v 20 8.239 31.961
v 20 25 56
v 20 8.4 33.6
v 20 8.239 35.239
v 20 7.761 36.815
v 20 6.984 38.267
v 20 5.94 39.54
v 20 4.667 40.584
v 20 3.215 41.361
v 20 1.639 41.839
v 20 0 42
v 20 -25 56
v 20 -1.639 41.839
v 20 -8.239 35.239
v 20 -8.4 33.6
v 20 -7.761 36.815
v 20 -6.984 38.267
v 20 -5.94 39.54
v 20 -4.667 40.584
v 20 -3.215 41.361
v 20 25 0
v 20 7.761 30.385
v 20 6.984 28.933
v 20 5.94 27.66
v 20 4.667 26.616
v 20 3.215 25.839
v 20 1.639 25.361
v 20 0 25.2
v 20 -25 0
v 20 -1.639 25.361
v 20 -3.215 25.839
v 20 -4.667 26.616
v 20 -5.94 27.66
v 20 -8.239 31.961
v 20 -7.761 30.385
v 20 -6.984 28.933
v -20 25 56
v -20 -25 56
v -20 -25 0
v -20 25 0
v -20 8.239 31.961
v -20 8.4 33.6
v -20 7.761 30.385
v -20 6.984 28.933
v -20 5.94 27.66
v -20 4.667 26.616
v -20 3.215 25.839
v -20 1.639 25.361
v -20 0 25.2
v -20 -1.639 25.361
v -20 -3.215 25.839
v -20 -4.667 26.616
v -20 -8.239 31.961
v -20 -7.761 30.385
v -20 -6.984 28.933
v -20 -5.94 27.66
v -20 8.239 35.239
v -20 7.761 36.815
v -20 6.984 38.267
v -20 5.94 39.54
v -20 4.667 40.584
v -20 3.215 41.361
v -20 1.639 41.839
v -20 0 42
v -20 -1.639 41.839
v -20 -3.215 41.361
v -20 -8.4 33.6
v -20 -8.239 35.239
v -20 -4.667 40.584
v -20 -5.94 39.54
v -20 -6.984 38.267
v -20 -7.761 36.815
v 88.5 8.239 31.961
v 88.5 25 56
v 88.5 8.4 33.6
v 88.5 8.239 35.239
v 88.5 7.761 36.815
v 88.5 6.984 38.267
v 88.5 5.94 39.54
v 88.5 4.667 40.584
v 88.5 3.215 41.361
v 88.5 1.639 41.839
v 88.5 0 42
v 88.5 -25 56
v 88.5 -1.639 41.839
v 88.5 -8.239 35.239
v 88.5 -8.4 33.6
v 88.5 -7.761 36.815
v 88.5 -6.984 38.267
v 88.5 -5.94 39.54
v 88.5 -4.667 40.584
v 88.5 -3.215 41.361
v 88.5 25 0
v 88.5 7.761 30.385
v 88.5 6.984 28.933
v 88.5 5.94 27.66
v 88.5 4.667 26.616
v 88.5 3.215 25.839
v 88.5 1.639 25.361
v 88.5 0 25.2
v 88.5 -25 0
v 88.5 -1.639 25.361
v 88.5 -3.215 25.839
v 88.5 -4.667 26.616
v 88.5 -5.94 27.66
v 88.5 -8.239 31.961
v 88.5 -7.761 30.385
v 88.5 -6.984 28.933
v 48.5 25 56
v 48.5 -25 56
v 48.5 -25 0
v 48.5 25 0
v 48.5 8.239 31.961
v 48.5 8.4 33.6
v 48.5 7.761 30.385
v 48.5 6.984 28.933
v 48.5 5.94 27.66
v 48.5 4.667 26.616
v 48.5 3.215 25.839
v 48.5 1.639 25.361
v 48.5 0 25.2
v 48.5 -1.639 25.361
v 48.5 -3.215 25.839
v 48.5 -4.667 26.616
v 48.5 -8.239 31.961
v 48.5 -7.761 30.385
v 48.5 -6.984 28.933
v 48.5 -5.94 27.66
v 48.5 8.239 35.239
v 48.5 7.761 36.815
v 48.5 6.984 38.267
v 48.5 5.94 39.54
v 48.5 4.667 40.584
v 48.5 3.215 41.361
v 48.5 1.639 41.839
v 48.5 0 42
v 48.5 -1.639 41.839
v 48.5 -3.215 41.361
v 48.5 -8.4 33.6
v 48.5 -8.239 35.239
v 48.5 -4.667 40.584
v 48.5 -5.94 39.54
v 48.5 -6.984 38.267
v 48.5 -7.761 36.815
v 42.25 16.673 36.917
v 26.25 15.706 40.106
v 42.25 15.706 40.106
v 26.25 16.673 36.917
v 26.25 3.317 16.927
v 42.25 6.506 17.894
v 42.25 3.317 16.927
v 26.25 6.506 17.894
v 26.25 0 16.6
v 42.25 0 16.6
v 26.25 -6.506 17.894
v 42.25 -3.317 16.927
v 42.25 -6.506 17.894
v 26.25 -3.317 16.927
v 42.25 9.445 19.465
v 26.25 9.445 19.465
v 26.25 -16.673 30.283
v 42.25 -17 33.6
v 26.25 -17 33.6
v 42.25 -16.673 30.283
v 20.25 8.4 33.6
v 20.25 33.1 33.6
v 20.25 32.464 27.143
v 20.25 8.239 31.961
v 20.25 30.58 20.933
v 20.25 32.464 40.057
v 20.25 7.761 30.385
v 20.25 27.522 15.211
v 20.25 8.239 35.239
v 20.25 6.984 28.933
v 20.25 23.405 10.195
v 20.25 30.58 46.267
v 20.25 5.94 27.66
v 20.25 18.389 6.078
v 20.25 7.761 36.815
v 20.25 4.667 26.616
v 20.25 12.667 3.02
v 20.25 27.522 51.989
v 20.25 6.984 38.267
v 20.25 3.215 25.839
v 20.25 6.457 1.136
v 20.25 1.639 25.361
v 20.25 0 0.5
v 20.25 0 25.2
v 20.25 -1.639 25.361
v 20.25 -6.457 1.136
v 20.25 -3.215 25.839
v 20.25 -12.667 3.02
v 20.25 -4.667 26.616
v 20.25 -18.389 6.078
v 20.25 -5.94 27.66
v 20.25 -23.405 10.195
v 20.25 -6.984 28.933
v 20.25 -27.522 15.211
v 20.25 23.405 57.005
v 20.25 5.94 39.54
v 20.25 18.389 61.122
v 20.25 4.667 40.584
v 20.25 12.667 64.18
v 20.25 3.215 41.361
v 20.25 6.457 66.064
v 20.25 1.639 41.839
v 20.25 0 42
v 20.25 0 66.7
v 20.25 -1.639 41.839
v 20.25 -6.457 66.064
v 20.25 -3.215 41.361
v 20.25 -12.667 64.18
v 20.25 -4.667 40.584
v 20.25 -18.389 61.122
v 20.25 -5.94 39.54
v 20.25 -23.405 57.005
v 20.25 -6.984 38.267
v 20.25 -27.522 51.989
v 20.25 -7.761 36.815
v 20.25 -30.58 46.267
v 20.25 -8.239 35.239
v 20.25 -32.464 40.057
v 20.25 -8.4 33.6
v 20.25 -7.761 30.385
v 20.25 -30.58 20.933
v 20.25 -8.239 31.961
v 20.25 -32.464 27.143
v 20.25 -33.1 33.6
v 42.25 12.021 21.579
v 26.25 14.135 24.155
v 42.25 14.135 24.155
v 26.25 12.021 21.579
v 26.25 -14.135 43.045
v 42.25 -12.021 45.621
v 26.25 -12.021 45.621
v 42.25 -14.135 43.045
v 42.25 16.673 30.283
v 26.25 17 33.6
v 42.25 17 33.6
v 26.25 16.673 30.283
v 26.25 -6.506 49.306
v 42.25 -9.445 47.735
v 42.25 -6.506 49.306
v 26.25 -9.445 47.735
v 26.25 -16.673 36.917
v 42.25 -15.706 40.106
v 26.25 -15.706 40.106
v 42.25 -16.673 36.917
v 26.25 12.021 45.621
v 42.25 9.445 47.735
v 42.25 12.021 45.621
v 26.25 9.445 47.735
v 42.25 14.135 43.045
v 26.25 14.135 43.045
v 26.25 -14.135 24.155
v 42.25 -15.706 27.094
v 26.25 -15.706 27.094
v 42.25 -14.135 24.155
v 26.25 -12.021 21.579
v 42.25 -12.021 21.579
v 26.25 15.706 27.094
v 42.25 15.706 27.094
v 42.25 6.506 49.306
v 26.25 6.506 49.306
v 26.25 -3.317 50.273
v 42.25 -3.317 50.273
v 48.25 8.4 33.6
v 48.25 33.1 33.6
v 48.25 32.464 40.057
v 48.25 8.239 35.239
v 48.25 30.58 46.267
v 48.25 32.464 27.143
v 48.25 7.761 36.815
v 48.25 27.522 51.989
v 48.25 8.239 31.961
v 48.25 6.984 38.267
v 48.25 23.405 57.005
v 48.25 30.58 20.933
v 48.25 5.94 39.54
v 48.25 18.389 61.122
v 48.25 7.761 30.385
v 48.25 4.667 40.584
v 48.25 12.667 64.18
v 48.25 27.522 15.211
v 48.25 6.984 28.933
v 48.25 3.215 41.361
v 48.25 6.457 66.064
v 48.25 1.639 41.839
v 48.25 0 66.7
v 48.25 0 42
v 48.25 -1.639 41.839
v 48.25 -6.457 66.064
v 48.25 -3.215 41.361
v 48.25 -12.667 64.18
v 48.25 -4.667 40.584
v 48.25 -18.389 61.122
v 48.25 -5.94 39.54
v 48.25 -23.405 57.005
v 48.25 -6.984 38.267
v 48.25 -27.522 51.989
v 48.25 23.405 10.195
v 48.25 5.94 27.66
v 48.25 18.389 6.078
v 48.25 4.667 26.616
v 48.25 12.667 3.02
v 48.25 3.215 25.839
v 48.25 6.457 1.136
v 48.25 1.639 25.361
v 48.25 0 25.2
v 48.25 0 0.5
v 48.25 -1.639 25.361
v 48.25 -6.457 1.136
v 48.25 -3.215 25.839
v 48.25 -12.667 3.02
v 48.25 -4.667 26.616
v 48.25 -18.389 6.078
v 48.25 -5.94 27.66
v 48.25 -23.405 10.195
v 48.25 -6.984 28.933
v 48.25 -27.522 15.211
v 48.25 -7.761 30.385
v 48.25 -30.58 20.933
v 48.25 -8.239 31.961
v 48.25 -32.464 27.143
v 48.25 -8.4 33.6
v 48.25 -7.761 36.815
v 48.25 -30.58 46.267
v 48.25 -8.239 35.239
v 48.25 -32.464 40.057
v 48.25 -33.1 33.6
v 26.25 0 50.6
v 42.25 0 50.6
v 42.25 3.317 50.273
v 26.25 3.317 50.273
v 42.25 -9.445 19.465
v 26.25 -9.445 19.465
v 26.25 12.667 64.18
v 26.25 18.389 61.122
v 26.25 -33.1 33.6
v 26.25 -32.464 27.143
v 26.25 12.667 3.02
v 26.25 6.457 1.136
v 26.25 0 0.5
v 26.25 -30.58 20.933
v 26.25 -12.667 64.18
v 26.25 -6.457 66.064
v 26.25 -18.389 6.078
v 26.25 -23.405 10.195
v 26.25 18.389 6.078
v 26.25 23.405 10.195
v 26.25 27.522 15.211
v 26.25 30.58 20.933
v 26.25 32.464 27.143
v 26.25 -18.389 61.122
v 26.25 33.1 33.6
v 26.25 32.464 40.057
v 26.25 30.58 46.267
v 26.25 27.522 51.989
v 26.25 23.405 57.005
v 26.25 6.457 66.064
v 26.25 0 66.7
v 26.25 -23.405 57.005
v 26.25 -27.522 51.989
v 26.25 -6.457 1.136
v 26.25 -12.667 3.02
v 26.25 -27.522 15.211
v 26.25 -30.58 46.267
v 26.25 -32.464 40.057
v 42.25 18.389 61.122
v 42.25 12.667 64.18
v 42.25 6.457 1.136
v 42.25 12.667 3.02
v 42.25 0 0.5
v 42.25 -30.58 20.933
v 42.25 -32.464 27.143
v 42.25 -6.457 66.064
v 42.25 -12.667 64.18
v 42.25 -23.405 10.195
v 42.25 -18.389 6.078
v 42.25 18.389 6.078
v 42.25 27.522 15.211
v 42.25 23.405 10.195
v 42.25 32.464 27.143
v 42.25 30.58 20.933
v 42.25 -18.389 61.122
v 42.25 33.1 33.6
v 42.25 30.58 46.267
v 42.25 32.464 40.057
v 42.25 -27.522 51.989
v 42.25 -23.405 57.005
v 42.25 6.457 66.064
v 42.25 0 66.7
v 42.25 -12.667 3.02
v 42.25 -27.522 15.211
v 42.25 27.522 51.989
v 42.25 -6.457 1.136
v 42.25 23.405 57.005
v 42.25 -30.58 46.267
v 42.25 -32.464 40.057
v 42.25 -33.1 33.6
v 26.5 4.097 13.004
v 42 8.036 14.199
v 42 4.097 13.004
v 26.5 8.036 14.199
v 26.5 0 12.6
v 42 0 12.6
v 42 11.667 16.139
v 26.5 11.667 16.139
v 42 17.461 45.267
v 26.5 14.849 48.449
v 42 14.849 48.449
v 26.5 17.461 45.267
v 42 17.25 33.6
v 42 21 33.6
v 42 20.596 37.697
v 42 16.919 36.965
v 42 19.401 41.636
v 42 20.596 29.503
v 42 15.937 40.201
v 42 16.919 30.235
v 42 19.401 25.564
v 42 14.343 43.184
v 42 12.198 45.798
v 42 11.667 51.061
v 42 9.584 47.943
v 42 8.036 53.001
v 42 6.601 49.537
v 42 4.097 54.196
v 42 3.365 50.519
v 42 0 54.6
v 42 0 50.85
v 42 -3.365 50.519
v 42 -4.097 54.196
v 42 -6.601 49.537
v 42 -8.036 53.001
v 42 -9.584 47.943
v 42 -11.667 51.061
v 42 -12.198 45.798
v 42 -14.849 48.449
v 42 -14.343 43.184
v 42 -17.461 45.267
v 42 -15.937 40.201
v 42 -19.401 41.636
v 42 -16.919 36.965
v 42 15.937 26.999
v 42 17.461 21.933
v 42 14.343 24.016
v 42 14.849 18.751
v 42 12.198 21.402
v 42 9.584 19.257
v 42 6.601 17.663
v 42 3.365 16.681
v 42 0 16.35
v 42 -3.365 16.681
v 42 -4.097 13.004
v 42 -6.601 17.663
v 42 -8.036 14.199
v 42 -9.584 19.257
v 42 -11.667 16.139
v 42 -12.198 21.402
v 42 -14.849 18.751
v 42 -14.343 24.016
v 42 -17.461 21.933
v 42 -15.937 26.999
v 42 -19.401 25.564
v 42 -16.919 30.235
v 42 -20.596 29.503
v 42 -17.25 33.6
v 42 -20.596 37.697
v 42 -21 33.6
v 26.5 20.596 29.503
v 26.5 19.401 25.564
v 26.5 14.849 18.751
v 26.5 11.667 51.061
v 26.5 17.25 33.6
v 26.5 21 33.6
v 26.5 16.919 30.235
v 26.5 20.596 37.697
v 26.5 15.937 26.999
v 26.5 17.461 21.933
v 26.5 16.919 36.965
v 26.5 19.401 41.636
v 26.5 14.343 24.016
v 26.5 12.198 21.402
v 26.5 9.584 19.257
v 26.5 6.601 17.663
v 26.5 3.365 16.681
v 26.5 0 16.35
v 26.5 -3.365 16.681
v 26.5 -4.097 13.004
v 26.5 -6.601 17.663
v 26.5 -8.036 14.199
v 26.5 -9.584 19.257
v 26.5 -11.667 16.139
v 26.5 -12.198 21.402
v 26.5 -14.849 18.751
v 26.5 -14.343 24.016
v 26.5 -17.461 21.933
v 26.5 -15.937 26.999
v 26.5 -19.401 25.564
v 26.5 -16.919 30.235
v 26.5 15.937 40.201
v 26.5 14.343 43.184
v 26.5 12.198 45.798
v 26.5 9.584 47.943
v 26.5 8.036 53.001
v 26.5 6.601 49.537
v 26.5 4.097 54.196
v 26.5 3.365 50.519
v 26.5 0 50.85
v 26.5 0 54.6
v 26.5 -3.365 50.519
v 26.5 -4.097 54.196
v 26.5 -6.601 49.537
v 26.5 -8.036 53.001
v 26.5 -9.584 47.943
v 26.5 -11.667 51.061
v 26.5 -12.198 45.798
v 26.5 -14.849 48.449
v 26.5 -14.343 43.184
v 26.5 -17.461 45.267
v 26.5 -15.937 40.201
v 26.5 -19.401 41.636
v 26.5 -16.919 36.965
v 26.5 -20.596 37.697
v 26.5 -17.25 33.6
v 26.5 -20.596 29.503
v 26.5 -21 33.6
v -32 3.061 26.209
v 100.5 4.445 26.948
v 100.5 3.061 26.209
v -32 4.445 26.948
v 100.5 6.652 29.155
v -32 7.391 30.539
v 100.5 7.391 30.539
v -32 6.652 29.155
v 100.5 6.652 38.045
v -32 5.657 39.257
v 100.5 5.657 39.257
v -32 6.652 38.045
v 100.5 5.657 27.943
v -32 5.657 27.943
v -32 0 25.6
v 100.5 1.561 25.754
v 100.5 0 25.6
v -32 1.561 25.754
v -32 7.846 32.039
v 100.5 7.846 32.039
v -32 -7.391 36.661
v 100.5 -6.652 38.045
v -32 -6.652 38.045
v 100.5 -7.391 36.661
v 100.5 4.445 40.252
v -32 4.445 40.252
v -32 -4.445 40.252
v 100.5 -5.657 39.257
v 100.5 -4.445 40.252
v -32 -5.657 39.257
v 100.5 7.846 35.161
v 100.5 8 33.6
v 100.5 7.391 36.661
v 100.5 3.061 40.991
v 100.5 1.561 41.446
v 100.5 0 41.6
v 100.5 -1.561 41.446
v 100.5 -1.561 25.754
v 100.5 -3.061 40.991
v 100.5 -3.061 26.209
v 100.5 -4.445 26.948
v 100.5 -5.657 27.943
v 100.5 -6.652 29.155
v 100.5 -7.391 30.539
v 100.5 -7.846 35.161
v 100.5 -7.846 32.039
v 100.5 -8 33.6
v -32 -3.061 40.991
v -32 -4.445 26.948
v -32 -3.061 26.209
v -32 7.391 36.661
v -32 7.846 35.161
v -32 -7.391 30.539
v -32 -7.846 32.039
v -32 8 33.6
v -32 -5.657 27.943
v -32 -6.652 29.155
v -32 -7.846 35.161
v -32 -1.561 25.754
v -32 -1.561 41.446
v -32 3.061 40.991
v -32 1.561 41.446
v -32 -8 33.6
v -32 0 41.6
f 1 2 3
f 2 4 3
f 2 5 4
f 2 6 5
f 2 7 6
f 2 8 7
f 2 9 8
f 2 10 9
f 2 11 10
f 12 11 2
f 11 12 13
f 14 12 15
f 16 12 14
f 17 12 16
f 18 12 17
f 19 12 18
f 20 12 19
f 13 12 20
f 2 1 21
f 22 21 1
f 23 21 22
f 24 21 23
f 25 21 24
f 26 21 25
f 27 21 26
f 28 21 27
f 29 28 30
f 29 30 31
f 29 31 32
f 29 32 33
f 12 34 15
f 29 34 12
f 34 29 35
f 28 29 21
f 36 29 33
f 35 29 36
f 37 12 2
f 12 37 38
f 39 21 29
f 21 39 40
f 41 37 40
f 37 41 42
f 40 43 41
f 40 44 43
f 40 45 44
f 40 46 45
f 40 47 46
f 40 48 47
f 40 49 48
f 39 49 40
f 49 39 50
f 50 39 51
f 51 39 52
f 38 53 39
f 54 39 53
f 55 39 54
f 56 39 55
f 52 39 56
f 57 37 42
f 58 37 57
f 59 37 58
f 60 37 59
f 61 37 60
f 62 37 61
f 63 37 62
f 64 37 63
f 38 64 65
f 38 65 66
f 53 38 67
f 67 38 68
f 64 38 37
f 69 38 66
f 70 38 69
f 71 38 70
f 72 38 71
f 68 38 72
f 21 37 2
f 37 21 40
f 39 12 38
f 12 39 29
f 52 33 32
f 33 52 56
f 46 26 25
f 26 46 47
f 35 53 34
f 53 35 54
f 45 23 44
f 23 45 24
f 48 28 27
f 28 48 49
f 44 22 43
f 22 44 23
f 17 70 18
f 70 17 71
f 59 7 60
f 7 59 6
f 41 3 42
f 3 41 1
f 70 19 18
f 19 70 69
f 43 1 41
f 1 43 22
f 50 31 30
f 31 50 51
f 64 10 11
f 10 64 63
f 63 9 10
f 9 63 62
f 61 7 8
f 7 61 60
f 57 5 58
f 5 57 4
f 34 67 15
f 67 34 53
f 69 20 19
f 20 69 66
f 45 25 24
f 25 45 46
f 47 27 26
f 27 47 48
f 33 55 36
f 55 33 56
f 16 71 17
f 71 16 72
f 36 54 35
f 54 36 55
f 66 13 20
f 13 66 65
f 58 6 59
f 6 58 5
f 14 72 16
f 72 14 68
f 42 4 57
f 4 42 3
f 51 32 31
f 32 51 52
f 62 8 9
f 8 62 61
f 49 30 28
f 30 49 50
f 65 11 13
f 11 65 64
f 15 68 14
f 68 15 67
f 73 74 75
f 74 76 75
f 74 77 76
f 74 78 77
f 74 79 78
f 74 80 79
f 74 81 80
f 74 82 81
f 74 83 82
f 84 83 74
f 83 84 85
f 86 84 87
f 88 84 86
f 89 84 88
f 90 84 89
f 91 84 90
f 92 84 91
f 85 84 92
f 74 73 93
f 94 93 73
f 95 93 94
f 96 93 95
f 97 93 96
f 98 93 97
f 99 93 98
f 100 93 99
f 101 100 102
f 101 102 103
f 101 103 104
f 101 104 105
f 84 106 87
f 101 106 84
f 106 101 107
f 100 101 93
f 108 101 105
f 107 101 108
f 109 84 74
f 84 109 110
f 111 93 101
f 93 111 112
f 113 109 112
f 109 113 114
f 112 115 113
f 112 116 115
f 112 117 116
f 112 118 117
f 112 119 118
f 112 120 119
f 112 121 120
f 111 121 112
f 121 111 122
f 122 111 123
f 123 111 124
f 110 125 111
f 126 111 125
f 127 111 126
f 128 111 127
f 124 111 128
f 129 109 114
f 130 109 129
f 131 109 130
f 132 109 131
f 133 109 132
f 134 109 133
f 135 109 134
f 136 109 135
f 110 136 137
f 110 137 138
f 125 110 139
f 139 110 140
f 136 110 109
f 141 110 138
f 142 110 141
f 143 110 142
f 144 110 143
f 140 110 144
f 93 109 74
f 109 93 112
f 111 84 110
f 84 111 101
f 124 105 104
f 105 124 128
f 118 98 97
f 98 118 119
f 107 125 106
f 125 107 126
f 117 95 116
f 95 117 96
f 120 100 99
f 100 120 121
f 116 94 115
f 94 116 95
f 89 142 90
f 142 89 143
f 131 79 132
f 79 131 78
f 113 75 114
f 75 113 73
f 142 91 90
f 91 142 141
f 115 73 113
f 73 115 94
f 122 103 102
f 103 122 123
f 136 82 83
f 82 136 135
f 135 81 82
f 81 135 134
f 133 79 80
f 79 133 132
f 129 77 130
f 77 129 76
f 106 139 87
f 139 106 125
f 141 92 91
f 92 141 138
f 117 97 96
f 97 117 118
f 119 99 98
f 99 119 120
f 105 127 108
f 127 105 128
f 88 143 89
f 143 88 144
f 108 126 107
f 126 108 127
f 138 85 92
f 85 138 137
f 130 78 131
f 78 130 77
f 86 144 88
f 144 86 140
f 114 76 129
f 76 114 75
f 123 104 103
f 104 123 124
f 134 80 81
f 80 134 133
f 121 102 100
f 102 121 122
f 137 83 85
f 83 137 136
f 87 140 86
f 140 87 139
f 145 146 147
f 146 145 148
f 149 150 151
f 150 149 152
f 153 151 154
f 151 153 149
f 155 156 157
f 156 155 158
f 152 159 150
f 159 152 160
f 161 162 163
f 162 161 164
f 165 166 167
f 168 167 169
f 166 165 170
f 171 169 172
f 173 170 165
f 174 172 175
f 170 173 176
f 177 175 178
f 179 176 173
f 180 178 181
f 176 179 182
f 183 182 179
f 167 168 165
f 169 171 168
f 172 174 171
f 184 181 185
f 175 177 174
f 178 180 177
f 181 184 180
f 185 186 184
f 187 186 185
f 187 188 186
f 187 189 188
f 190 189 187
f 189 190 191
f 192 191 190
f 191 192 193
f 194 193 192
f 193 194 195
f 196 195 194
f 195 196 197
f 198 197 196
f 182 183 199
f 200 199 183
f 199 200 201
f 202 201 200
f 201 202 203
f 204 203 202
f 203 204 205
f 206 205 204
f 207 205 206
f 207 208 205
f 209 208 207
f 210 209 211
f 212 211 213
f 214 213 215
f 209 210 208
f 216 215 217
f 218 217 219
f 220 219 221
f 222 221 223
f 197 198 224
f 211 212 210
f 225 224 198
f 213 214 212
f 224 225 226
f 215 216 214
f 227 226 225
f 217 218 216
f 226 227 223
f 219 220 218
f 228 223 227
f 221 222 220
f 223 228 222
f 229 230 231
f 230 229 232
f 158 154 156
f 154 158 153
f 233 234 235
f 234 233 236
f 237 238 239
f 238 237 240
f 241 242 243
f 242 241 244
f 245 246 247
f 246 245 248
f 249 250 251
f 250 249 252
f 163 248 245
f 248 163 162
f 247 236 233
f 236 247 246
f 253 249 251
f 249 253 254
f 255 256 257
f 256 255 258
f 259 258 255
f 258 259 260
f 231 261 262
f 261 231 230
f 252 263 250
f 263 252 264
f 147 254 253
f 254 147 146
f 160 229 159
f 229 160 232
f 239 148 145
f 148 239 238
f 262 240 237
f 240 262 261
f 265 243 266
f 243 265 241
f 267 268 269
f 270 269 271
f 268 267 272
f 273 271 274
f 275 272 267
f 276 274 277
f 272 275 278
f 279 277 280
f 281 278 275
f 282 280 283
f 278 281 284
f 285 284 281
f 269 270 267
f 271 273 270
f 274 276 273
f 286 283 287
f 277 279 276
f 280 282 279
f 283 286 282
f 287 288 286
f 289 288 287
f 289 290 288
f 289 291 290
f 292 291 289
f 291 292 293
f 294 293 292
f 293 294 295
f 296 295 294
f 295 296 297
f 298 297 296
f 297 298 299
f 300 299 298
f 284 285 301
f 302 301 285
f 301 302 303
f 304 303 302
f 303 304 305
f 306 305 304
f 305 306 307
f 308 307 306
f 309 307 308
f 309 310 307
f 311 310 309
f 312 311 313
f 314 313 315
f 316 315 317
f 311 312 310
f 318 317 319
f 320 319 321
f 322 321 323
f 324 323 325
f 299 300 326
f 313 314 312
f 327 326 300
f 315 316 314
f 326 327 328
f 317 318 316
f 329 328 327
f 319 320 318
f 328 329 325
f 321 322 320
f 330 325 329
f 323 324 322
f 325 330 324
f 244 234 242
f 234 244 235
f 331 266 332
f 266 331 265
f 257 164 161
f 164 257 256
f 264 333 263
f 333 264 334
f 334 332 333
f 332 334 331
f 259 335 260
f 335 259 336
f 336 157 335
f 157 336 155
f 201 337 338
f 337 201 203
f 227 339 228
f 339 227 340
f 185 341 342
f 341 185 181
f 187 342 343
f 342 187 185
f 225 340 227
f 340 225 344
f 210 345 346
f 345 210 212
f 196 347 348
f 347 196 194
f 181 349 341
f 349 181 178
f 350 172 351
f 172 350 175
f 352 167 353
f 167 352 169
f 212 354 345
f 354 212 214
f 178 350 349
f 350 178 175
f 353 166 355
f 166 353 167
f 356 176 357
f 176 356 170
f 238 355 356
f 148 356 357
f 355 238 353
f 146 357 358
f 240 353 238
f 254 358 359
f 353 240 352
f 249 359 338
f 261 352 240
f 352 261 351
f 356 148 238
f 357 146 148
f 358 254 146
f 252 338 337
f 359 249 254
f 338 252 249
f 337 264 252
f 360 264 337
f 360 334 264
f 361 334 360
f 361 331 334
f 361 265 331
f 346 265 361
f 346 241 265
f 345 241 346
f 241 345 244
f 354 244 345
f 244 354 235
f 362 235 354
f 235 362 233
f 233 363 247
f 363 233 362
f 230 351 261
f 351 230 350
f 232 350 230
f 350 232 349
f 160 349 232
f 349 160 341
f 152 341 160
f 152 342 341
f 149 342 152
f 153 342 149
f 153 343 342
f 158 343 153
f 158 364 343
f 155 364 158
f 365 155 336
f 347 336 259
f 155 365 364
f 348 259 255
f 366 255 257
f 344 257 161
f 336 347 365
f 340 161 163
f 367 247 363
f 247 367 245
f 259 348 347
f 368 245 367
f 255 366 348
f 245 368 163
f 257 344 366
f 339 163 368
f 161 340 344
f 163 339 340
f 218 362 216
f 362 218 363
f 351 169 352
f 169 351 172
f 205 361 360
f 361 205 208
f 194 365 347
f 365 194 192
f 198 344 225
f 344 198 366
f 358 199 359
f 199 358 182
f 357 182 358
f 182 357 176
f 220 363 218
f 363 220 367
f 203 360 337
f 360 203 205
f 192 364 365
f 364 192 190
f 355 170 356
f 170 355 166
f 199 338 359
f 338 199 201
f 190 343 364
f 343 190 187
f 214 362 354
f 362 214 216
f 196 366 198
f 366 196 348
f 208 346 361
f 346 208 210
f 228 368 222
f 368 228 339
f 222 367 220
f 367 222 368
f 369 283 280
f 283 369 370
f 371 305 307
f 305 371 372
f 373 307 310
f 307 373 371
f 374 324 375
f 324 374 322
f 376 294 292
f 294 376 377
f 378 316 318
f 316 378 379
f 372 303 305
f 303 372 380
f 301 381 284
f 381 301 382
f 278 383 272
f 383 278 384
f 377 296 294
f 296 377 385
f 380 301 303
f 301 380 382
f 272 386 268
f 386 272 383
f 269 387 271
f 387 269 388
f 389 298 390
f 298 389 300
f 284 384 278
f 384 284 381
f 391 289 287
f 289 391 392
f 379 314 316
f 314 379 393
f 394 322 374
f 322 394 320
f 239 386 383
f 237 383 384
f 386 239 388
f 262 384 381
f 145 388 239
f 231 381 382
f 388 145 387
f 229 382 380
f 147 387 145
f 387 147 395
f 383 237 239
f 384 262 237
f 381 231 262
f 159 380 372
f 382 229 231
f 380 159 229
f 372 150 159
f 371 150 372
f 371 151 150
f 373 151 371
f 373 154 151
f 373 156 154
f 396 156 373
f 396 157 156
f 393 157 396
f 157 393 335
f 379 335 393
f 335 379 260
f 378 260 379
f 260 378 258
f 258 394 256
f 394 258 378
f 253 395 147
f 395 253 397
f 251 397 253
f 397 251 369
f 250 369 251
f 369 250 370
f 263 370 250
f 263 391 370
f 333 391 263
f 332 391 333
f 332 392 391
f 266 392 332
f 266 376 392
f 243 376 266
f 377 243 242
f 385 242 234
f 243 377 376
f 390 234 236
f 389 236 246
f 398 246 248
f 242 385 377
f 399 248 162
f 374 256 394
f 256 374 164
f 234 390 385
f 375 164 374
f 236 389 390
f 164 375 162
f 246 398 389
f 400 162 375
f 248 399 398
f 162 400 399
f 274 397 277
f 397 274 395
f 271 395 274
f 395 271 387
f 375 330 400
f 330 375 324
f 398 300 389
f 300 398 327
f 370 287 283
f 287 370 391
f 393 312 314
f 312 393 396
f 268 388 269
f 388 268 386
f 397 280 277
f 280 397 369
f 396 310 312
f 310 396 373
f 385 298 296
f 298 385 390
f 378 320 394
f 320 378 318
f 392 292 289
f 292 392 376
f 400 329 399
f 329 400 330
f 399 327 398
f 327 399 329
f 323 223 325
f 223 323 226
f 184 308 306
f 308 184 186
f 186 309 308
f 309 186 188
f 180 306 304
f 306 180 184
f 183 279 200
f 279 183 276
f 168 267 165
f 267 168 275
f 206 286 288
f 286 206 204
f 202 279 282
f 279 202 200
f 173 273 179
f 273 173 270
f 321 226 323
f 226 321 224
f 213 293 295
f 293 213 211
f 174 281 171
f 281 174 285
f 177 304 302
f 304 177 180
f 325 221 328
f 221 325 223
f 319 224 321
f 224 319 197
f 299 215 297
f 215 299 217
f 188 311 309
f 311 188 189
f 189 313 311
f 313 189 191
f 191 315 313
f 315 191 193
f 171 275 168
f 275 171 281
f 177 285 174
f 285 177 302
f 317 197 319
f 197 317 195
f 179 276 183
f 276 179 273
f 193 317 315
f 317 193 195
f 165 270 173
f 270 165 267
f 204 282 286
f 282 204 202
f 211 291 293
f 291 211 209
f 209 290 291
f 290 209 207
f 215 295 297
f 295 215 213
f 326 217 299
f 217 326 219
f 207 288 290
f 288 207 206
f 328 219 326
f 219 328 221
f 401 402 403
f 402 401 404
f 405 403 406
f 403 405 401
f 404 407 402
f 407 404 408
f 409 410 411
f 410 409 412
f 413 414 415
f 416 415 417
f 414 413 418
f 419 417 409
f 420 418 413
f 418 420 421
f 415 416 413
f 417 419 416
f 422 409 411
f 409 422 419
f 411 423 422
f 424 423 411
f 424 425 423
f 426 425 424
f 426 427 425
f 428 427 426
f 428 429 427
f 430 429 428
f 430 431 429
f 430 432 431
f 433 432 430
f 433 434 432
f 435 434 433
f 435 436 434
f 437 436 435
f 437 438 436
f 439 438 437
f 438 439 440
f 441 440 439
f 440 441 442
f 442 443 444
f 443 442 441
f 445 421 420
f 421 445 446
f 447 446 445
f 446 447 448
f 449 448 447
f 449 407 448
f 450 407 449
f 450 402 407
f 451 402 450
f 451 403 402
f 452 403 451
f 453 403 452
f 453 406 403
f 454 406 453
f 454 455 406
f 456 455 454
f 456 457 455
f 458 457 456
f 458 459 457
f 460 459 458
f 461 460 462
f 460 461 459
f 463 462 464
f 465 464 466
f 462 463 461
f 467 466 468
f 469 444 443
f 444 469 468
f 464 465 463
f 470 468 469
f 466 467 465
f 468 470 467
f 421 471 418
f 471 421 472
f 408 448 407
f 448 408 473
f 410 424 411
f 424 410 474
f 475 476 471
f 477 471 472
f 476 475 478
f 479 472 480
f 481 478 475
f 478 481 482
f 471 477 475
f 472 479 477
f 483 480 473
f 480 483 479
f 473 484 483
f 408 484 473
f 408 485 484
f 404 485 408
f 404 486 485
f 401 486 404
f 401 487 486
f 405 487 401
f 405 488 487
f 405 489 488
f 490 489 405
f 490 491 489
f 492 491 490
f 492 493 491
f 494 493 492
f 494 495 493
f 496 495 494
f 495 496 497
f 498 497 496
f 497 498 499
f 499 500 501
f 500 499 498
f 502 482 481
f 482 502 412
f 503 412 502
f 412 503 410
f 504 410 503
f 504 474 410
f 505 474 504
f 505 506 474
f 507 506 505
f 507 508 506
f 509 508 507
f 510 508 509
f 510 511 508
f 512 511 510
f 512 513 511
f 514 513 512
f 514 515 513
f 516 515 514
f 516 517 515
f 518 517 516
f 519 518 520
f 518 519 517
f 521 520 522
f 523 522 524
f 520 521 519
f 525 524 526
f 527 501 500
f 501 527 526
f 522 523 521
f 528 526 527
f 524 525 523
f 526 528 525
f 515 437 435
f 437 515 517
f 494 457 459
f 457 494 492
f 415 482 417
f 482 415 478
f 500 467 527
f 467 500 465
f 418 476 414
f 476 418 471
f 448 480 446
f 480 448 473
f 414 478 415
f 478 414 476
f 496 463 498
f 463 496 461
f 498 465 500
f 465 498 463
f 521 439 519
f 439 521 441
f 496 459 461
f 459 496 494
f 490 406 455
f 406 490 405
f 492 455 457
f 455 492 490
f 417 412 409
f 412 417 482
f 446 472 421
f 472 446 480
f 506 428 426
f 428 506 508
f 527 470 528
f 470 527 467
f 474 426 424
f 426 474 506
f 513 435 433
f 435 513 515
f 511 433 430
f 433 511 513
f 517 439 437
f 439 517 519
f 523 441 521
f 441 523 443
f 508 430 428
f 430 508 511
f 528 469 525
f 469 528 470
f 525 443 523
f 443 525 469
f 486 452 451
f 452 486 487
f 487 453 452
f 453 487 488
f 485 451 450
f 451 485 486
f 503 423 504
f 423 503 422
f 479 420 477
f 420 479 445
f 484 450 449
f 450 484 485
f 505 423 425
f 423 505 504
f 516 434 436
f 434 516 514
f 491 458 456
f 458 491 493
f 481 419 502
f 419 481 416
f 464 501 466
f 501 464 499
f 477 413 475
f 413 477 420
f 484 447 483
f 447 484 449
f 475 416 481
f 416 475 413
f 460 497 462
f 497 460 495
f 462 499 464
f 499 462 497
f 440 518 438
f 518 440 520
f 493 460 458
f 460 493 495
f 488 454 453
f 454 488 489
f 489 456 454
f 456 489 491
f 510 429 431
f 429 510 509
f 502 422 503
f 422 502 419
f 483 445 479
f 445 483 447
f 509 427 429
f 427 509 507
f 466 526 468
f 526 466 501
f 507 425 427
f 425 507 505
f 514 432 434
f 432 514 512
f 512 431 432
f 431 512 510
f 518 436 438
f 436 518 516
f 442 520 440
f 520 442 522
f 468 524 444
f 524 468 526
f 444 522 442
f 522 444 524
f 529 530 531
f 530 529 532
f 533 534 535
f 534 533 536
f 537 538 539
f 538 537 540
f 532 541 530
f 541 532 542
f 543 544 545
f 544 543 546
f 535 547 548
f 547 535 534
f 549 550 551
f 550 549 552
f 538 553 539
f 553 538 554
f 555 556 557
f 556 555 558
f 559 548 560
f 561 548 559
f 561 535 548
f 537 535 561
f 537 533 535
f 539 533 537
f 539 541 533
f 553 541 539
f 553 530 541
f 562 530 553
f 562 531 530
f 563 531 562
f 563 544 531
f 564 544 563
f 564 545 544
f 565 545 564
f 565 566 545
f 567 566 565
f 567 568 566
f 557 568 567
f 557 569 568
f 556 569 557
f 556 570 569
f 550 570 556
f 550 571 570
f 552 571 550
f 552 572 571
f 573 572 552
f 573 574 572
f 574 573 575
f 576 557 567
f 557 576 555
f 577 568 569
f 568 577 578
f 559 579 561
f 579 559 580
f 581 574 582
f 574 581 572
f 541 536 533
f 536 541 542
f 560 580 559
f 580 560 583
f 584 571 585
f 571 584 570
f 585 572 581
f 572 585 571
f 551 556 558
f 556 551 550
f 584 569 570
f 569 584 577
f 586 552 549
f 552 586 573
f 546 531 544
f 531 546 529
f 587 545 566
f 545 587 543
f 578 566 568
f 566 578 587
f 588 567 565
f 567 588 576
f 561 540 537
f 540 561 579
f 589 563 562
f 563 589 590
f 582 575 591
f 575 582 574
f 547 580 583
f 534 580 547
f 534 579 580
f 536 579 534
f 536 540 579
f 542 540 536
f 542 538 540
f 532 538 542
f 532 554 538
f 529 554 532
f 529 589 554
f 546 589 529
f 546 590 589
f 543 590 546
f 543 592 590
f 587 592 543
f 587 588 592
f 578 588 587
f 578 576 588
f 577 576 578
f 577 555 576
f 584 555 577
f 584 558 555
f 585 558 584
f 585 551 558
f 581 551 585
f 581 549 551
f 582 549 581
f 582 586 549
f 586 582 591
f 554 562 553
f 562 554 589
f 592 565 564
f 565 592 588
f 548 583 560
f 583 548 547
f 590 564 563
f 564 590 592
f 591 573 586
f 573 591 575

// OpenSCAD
$fn = 32;

// ------------------------------------------------------------------------
// Pulley assembly: d66.2 pulley with a belt, shaft d16
// Every part is its own module, assembly() places them once.
// ------------------------------------------------------------------------

// --- part 1 ---
module support1() {
  difference() {
    translate([-20, -25, 0]) cube([40, 50, 56]);
    translate([0, 0, 33.6]) rotate([0, 90, 0]) cylinder(h = 42, d = 16.8, center = true);
  }
}

// --- part 2 ---
module support2() {
  difference() {
    translate([-20, -25, 0]) cube([40, 50, 56]);
    translate([0, 0, 33.6]) rotate([0, 90, 0]) cylinder(h = 42, d = 16.8, center = true);
  }
}

// --- part 3 ---
module shaft() {
  translate([0, 0, -66.25]) cylinder(h = 132.5, d = 16);
}

// --- part 4 ---
module pulley() {
  difference() {
    union() {
      cylinder(h = 28, d = 34);
      cylinder(h = 6, d = 66.2);
      translate([0, 0, 22]) cylinder(h = 6, d = 66.2);
    }
    translate([0, 0, -1]) cylinder(h = 30, d = 16.8);
  }
}

// --- part 5 ---
module belt() {
  difference() {
      translate([0, 0, 0]) cylinder(h = 15.5, d = 42);
      translate([0, 0, -1]) cylinder(h = 17.5, d = 34.5);
    }
}

// --- assembly ---
module assembly() {
  translate([0, 0, 0]) rotate([0, 0, 0]) support1();
  translate([68.5, 0, 0]) rotate([0, 0, 0]) support2();
  translate([34.25, 0, 33.6]) rotate([0, 90, 0]) shaft();
  translate([20.25, 0, 33.6]) rotate([0, 90, 0]) pulley();
  translate([26.5, 0, 33.6]) rotate([0, 90, 0]) belt();
}

assembly();
